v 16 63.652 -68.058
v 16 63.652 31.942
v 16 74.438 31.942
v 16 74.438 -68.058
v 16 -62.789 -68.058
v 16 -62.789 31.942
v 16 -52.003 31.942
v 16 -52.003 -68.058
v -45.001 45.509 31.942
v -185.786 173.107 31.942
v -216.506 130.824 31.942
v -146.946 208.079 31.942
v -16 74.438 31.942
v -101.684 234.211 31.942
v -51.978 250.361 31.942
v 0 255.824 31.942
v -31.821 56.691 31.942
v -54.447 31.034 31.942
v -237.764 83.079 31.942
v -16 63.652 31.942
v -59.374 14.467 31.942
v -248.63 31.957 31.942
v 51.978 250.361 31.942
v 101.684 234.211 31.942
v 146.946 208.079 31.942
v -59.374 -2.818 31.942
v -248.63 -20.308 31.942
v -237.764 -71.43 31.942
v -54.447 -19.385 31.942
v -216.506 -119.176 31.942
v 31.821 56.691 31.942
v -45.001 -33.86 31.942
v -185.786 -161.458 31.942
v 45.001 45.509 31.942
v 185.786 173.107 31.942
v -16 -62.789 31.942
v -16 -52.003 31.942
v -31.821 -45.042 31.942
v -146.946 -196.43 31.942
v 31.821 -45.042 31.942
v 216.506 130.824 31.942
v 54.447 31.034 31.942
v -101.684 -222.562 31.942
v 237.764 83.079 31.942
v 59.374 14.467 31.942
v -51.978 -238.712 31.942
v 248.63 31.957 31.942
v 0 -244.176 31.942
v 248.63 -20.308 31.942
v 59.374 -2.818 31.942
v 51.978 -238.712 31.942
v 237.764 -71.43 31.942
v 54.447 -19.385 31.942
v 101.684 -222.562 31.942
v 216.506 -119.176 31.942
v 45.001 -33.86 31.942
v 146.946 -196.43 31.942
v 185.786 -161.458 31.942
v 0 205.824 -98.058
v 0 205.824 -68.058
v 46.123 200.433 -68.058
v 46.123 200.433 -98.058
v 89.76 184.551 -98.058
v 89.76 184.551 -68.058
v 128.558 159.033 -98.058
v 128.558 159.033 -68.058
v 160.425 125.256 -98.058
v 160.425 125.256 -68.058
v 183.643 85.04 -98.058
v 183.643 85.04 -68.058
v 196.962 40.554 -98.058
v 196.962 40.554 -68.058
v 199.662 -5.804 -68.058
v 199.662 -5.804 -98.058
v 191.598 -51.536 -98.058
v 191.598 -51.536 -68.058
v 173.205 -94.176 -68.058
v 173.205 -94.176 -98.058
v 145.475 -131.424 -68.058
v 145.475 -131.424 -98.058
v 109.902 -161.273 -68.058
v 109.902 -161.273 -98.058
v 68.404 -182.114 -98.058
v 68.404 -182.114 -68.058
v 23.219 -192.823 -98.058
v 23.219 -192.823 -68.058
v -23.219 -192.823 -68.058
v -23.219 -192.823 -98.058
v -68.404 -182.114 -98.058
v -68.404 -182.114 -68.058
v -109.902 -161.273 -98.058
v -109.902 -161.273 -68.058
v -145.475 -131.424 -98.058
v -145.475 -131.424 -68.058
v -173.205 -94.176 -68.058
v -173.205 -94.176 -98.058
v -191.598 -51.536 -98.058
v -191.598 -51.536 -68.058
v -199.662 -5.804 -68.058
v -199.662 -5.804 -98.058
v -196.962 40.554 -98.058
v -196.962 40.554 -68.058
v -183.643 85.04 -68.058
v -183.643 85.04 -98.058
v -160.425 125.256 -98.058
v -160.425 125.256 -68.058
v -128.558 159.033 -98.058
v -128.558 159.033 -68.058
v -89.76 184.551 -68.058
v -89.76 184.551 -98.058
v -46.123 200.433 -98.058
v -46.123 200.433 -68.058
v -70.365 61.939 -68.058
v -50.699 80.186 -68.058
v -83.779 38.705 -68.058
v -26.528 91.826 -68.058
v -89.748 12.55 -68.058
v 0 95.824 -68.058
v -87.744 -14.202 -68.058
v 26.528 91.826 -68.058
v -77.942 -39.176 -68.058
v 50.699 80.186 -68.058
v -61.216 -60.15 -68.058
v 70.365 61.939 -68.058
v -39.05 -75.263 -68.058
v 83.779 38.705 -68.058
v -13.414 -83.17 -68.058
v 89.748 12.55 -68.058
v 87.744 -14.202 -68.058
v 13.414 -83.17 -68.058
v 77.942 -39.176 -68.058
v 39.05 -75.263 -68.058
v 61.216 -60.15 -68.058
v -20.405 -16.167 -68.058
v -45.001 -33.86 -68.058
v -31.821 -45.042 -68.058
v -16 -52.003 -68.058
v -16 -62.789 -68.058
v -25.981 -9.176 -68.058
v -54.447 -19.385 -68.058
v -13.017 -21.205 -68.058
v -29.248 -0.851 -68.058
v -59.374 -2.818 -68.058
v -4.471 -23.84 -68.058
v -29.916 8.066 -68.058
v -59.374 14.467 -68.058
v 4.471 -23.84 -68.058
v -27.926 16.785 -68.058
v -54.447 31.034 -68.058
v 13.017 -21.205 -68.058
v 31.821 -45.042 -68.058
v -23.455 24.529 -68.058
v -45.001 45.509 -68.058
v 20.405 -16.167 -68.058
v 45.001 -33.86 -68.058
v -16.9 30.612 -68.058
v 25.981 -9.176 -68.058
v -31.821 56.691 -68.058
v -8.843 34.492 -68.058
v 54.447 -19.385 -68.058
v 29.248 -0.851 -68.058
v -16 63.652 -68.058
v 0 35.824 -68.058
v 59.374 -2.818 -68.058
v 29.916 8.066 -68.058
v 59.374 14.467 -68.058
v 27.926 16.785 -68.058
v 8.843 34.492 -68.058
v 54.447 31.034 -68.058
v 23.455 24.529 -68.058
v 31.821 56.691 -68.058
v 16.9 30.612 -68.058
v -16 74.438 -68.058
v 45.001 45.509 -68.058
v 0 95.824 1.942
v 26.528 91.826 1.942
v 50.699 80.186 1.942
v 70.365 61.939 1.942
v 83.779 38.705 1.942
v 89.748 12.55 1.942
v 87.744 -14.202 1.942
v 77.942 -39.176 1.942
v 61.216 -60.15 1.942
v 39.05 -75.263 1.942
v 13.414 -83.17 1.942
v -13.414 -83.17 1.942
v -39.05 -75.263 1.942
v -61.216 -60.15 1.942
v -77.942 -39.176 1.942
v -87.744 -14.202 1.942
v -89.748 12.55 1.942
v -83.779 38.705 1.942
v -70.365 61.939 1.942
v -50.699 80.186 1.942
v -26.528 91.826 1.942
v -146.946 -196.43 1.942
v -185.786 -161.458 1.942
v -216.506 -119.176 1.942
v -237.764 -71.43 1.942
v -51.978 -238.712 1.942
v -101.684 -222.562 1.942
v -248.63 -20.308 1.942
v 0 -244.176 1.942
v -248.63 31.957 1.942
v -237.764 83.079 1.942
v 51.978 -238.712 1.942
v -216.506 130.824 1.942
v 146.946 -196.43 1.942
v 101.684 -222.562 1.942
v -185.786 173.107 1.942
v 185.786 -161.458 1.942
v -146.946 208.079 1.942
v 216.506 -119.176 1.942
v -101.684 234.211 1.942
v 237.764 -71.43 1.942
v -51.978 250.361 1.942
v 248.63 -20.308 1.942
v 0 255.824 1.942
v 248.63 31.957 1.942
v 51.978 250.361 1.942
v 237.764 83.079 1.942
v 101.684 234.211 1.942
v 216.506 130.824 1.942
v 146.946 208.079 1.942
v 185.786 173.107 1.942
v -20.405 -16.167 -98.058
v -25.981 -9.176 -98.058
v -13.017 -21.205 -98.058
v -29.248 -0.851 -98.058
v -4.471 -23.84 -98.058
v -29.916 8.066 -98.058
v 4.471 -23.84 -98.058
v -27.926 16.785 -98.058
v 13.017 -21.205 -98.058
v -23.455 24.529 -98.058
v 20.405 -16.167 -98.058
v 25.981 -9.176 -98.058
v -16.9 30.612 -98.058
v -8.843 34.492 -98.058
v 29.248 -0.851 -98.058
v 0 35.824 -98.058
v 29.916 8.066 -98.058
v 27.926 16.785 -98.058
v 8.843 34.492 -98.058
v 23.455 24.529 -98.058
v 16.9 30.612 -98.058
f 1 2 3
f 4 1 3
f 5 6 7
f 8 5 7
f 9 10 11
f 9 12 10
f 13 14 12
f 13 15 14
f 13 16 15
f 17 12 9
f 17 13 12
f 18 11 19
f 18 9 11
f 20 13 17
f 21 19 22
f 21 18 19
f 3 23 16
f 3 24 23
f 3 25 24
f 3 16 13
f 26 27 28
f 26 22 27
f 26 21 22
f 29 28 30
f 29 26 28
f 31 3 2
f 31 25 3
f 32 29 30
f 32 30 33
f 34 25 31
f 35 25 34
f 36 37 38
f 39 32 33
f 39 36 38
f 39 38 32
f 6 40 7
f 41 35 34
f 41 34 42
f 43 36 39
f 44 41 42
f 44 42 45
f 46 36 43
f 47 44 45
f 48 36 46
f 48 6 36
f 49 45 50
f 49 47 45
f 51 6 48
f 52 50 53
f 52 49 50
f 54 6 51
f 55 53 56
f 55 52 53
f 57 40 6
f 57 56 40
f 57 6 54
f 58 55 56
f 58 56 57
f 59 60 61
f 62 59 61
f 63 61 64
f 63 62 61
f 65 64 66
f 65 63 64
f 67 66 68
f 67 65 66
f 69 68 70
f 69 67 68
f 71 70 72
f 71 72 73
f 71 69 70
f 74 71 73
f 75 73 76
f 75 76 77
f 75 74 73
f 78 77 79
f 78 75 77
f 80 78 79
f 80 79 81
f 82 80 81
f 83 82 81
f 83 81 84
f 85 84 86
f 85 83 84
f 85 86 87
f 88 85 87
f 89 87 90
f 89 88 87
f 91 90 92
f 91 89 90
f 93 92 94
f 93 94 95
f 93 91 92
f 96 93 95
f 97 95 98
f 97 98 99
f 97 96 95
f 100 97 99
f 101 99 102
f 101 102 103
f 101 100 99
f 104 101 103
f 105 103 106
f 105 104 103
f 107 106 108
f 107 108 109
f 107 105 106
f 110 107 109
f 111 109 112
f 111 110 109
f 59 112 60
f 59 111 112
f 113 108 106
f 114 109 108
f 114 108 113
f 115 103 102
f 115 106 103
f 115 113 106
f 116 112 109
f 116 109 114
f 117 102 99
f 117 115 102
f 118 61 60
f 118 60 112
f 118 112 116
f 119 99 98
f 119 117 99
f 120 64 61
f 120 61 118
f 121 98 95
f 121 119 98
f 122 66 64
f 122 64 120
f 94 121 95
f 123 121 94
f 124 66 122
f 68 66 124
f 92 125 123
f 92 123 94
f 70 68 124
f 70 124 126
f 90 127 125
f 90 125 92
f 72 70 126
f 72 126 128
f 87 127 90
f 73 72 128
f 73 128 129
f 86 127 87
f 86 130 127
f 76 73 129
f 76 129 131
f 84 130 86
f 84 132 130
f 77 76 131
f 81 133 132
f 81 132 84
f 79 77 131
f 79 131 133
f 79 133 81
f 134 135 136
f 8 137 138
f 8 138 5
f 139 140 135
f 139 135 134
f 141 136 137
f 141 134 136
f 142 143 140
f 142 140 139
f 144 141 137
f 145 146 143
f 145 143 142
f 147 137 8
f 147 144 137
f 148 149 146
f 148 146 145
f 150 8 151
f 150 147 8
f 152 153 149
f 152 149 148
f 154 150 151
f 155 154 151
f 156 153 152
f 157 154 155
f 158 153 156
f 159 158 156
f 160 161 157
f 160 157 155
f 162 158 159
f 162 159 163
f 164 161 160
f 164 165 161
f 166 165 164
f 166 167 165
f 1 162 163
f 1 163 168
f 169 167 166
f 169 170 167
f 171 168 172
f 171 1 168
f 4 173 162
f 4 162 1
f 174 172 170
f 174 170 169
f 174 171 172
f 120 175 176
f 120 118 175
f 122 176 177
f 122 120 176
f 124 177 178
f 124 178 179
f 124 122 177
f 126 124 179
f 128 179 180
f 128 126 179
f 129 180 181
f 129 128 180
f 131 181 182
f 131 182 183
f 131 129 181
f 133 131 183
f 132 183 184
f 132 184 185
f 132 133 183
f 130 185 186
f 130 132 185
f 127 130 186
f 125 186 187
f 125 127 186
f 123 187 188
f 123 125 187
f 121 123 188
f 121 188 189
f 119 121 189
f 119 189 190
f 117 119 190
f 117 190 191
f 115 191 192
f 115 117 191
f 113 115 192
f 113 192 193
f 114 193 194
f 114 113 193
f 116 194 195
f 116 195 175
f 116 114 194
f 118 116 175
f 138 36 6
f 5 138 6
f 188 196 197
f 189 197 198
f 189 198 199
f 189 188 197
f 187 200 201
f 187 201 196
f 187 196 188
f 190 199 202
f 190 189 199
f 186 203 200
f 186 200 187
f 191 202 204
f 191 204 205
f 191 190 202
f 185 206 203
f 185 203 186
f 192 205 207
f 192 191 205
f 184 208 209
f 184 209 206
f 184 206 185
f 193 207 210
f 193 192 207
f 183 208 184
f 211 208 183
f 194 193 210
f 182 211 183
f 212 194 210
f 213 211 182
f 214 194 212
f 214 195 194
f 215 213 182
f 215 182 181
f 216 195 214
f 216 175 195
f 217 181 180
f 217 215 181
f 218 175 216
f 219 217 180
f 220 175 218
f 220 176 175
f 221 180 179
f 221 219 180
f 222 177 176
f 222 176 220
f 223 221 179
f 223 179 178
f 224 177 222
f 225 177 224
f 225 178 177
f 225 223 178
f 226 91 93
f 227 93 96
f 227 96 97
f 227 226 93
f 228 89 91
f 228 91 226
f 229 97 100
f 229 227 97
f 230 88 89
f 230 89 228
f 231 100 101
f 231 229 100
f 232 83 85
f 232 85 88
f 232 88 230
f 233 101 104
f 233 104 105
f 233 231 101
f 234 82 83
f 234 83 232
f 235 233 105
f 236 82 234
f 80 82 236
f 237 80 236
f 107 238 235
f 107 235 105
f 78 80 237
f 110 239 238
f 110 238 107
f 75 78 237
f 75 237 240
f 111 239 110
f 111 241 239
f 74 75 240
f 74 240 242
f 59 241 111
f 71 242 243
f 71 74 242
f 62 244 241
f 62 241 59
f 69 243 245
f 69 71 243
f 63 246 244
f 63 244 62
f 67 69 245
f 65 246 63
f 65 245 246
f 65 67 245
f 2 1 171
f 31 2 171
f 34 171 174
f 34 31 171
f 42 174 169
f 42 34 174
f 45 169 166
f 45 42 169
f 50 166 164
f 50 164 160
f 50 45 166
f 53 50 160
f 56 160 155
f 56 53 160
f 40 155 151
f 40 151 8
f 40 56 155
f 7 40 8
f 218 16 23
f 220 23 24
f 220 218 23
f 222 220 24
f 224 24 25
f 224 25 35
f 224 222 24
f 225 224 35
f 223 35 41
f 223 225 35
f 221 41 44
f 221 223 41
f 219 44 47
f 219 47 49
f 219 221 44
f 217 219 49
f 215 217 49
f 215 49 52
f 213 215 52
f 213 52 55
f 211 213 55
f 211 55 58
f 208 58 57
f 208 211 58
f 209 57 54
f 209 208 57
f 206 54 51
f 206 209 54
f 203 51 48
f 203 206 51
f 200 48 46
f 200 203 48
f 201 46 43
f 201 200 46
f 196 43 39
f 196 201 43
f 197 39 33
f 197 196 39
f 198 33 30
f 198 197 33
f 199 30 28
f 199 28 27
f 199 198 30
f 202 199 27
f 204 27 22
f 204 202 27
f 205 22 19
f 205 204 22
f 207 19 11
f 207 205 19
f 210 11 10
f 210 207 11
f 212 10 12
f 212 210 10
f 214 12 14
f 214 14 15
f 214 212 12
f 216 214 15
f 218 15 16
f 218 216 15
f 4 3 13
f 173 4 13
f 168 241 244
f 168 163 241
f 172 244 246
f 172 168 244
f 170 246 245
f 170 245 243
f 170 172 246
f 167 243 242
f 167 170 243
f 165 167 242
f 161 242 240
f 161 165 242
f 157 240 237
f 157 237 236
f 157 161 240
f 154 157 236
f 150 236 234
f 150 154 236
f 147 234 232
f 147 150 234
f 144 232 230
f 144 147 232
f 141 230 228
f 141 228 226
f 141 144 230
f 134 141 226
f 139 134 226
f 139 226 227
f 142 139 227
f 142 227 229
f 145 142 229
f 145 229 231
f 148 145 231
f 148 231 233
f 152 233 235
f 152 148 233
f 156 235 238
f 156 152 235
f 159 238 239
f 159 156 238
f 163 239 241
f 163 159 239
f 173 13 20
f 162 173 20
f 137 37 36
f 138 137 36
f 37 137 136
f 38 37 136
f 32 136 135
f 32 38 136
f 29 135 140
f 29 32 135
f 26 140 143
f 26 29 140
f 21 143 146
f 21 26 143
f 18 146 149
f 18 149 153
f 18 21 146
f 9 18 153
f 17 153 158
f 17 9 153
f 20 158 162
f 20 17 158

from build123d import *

# Parameters (mm, degrees)
CUT_EXTRUDE1_DEPTH = 100
CIRPATTERN1_COUNT  = 2


with BuildPart() as part:
    # Sketch2 → Revolve1 (revolve)
    with BuildSketch(Plane(origin=(0, 0, 0), x_dir=(0, 0, -1), z_dir=(1, 0, 0))):
        Polygon((-31.942129743, 65.824496016), (-31.942129743, 255.824496016), (-1.942129743, 255.824496016), (-1.942129743, 95.824496016), (68.057870257, 95.824496016), (68.057870257, 205.824496016), (98.057870257, 205.824496016), (98.057870257, 35.824496016), (68.057870257, 35.824496016), (68.057870257, 65.824496016), align=None)
    revolve(axis=Axis((0, 5.824496016, 0), (0, 0, -1)))

    # Sketch3 → Cut-Extrude1 (cut)
    with BuildSketch(Plane.XY.offset(31.942129743)):
        with BuildLine():
            Line((16, 63.651825195), (16, 74.437748913))
            Line((16, 74.437748913), (-16, 74.437748913))
            Line((-16, 74.437748913), (-16, 63.651825195))
            ThreePointArc((-16, 63.651825195), (0, 65.824496016), (16, 63.651825195))
        make_face()
    cut_extrude1 = extrude(amount=-CUT_EXTRUDE1_DEPTH, mode=Mode.SUBTRACT)

    # CirPattern1: Cut-Extrude1 ×2 about axis
    cirpattern1_axis = Axis((0, 5.824496016, 0), (0, 0, 1))
    for i in range(1, CIRPATTERN1_COUNT):
        add(cut_extrude1.rotate(cirpattern1_axis, i * 360 / CIRPATTERN1_COUNT), mode=Mode.SUBTRACT)


solid = part.part
